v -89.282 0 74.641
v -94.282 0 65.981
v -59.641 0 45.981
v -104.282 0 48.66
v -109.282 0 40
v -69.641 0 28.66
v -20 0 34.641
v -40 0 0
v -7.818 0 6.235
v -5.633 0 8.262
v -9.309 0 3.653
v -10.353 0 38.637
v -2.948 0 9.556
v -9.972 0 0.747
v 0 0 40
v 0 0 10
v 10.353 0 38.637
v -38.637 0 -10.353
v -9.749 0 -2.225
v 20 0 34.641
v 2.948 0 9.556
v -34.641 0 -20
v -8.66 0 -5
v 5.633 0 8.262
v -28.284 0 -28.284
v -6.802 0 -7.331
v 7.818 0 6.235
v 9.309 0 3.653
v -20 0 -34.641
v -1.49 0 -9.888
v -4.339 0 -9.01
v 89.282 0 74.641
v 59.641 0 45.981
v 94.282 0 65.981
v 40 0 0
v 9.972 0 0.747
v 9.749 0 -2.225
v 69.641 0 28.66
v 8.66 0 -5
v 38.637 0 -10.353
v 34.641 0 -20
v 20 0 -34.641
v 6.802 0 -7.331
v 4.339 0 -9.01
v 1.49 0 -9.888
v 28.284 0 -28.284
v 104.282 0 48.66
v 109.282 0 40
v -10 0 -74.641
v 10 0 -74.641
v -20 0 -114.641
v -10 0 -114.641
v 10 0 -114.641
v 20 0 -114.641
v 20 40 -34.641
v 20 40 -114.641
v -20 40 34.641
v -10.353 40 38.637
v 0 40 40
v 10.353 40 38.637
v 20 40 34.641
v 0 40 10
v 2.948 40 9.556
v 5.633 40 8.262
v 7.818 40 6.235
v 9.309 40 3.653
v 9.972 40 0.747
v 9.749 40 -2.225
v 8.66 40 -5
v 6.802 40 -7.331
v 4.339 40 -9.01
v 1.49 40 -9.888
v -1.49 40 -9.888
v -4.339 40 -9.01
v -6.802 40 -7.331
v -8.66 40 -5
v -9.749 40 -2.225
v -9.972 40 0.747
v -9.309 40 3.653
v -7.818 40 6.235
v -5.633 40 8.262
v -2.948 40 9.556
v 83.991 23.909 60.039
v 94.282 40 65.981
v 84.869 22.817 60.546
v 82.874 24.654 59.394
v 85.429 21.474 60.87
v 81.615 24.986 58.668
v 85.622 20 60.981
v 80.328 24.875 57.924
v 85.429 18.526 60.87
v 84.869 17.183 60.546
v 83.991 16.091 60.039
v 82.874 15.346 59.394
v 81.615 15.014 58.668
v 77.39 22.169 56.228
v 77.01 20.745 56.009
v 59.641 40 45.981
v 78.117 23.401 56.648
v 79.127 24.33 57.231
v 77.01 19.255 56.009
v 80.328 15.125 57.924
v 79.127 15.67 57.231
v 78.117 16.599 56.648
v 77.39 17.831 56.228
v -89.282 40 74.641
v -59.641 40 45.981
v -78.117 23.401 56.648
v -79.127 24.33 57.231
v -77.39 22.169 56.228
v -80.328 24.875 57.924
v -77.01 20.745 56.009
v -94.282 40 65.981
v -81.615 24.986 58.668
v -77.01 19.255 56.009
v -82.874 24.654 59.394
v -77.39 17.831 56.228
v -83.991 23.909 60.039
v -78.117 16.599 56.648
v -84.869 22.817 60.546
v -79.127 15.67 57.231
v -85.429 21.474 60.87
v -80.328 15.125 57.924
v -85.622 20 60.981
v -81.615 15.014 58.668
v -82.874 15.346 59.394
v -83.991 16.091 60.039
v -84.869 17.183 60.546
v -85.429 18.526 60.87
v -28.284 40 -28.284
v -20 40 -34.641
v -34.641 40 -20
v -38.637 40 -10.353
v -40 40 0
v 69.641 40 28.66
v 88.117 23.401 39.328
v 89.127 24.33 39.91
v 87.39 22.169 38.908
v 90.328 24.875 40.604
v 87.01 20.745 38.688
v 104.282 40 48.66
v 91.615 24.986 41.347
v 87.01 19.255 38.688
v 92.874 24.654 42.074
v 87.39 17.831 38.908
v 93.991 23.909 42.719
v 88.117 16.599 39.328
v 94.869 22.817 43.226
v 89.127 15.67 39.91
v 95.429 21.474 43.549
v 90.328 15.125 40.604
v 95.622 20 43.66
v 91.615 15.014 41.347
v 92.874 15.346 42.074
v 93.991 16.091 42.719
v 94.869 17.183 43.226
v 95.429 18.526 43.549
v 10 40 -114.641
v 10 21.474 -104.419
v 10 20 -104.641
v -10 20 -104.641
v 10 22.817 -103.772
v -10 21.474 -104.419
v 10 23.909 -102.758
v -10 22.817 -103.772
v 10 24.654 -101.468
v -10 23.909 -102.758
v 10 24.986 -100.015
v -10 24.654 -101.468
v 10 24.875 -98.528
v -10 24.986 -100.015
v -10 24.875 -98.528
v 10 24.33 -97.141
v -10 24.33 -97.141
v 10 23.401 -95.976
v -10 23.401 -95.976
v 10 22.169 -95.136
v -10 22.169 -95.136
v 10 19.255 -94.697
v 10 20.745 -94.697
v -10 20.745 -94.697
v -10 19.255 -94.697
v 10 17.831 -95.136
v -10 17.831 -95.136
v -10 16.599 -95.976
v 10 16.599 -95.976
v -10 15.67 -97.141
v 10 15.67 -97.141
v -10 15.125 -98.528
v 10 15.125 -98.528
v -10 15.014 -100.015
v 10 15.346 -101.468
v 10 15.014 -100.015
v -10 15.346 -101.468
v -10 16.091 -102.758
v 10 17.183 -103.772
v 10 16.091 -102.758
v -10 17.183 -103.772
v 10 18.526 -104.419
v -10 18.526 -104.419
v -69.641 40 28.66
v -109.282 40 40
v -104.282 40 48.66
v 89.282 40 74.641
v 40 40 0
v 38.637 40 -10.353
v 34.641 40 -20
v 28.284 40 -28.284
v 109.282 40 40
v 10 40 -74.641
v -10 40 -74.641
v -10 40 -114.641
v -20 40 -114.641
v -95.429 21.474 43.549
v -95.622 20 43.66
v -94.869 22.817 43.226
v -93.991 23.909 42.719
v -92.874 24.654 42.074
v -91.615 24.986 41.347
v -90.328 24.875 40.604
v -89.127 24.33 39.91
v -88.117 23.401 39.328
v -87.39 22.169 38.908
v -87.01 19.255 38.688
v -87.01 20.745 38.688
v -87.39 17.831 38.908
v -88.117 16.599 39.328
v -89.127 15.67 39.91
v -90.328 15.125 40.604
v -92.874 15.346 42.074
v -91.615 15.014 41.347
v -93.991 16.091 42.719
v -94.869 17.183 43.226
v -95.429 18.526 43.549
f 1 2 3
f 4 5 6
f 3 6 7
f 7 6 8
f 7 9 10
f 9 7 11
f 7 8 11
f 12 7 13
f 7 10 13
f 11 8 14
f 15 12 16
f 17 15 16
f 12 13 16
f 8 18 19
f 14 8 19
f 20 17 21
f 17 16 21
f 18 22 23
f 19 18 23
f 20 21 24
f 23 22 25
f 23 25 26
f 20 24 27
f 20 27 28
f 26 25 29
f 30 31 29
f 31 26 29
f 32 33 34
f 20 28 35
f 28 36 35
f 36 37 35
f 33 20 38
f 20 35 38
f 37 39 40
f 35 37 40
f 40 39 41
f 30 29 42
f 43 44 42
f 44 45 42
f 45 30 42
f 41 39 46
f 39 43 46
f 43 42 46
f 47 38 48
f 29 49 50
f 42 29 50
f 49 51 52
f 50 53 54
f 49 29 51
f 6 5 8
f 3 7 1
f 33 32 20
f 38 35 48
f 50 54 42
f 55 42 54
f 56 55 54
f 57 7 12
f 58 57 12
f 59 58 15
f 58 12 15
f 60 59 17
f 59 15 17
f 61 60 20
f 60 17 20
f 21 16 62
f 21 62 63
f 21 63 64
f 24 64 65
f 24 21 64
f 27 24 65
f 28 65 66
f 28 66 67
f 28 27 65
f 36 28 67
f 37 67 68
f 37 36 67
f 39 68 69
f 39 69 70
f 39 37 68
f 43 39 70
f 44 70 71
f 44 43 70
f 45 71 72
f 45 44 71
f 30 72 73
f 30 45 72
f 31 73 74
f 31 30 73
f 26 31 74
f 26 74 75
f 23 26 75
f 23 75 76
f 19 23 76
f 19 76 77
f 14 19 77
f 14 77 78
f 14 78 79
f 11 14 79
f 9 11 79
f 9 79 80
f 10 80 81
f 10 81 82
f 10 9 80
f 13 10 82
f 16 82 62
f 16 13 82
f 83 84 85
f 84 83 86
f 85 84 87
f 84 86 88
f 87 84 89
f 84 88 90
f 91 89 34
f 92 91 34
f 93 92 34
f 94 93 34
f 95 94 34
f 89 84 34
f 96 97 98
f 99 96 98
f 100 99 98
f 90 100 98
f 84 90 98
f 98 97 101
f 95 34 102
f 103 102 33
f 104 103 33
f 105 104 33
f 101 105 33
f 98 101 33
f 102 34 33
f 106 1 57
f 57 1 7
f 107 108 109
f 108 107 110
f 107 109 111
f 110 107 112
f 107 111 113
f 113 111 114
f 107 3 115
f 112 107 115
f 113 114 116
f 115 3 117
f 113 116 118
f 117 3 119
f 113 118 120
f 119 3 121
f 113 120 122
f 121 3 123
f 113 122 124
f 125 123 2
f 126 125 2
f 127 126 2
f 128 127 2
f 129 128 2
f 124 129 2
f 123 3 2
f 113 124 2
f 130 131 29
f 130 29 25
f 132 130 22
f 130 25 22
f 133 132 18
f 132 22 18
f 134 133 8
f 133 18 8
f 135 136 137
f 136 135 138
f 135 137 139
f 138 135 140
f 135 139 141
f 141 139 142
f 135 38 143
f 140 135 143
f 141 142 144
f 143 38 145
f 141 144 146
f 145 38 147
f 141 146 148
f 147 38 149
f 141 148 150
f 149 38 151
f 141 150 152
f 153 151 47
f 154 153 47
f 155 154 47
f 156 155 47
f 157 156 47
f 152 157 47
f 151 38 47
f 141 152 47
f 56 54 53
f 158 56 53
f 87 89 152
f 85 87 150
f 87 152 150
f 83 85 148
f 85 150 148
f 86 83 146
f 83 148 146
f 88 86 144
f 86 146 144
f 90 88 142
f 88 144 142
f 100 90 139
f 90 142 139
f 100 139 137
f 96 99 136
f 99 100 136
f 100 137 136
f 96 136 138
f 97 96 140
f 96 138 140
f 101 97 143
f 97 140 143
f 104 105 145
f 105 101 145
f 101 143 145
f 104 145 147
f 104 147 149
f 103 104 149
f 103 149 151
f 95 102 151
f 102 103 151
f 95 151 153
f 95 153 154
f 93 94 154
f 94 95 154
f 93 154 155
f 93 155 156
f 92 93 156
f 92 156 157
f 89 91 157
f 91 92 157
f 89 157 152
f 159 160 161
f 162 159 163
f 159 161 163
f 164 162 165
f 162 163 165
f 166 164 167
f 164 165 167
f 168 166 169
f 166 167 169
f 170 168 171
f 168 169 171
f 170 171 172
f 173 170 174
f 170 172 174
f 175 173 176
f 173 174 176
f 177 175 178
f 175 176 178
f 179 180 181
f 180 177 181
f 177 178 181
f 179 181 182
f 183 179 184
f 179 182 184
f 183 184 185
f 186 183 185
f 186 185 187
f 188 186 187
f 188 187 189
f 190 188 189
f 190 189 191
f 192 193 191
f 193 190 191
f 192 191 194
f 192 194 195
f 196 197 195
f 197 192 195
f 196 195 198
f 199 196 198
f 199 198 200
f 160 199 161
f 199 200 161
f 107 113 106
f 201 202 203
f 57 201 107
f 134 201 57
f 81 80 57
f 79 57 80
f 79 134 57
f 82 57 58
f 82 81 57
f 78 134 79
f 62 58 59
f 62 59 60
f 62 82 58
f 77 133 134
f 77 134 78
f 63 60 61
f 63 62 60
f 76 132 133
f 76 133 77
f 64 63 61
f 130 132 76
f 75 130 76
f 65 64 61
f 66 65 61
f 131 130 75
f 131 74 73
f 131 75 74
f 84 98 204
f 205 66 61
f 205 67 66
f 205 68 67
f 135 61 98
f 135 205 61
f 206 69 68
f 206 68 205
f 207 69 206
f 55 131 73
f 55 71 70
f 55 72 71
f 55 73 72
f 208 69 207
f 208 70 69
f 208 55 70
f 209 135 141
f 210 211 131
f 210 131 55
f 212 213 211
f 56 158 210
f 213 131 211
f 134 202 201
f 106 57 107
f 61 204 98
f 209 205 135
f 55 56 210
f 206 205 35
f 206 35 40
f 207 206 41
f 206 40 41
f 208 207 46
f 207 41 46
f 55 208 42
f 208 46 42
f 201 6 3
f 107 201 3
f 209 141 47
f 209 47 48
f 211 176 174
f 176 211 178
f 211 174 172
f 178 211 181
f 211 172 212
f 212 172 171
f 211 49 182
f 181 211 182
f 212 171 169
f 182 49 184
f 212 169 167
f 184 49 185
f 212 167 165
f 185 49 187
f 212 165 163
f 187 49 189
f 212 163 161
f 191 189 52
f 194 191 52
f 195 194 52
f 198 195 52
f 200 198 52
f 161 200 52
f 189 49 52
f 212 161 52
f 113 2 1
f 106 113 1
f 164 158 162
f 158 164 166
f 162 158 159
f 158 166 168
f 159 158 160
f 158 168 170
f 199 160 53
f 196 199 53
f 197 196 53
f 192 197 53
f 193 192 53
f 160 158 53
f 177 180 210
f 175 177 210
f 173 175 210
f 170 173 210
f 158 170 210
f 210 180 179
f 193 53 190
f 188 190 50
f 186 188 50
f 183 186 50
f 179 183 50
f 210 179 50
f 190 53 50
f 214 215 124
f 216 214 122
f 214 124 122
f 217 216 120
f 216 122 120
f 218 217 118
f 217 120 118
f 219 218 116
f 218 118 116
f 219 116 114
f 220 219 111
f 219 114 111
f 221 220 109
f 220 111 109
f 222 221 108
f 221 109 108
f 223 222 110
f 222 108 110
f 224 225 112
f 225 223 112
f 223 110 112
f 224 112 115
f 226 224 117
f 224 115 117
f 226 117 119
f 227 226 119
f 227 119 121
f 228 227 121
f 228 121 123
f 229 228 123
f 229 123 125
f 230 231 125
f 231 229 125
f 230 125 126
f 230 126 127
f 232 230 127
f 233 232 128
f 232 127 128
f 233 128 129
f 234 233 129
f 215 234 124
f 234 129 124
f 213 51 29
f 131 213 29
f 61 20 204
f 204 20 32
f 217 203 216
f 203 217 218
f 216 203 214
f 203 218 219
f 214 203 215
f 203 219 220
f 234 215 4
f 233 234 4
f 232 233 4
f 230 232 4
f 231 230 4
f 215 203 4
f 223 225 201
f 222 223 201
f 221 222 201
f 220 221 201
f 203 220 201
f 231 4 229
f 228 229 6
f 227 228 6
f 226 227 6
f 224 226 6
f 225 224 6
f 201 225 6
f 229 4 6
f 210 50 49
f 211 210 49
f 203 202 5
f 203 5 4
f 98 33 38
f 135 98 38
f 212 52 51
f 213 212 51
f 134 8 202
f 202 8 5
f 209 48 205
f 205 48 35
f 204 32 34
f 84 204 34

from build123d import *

# Parameters (mm, degrees)
SKETCH1_R           = 10
BOSS_EXTRUDE1_DEPTH = 40
SKETCH2_R           = 5
BOSS_EXTRUDE2_DEPTH = 25
CIRPATTERN1_COUNT   = 3


with BuildPart() as part:
    # Sketch1 → Boss-Extrude1 (new body)
    with BuildSketch(Plane(origin=(0, 0, 0), x_dir=(1, 0, 0), z_dir=(0, 1, 0))):
        with BuildLine():
            Line((-10, 114.641016151), (-20, 114.641016151))
            Line((-20, 114.641016151), (-20, 34.641016151))
            ThreePointArc((-20, 34.641016151), (-34.641016151, 20), (-40, 0))
            Line((-40, 0), (-109.282032303, -40))
            Line((-109.282032303, -40), (-104.282032303, -48.660254038))
            Line((-104.282032303, -48.660254038), (-69.641016151, -28.660254038))
            Line((-69.641016151, -28.660254038), (-59.641016151, -45.980762114))
            Line((-59.641016151, -45.980762114), (-94.282032303, -65.980762114))
            Line((-94.282032303, -65.980762114), (-89.282032303, -74.641016151))
            Line((-89.282032303, -74.641016151), (-20, -34.641016151))
            ThreePointArc((-20, -34.641016151), (0, -40), (20, -34.641016151))
            Line((20, -34.641016151), (89.282032303, -74.641016151))
            Line((89.282032303, -74.641016151), (94.282032303, -65.980762114))
            Line((94.282032303, -65.980762114), (59.641016151, -45.980762114))
            Line((59.641016151, -45.980762114), (69.641016151, -28.660254038))
            Line((69.641016151, -28.660254038), (104.282032303, -48.660254038))
            Line((104.282032303, -48.660254038), (109.282032303, -40))
            Line((109.282032303, -40), (40, 0))
            ThreePointArc((40, 0), (34.641016151, 20), (20, 34.641016151))
            Line((20, 34.641016151), (20, 114.641016151))
            Line((20, 114.641016151), (10, 114.641016151))
            Line((10, 114.641016151), (10, 74.641016151))
            Line((10, 74.641016151), (-10, 74.641016151))
            Line((-10, 74.641016151), (-10, 114.641016151))
        make_face()
        with Locations(Location((0, 0, 0), (0, 0, 270))):
            Circle(SKETCH1_R, mode=Mode.SUBTRACT)
    extrude(amount=BOSS_EXTRUDE1_DEPTH)

    # Sketch2 → Boss-Extrude2 (add)
    with BuildSketch(Plane(origin=(-10, 0, 0), x_dir=(0, 0, -1), z_dir=(1, 0, 0))):
        with Locations((99.641016151, 20)):
            Circle(SKETCH2_R)
    boss_extrude2 = extrude(amount=BOSS_EXTRUDE2_DEPTH)

    # CirPattern1: Boss-Extrude2 ×3 about axis
    cirpattern1_axis = Axis((0, 40, 0), (0, 1, 0))
    for i in range(1, CIRPATTERN1_COUNT):
        add(boss_extrude2.rotate(cirpattern1_axis, i * 360 / CIRPATTERN1_COUNT))


solid = part.part
